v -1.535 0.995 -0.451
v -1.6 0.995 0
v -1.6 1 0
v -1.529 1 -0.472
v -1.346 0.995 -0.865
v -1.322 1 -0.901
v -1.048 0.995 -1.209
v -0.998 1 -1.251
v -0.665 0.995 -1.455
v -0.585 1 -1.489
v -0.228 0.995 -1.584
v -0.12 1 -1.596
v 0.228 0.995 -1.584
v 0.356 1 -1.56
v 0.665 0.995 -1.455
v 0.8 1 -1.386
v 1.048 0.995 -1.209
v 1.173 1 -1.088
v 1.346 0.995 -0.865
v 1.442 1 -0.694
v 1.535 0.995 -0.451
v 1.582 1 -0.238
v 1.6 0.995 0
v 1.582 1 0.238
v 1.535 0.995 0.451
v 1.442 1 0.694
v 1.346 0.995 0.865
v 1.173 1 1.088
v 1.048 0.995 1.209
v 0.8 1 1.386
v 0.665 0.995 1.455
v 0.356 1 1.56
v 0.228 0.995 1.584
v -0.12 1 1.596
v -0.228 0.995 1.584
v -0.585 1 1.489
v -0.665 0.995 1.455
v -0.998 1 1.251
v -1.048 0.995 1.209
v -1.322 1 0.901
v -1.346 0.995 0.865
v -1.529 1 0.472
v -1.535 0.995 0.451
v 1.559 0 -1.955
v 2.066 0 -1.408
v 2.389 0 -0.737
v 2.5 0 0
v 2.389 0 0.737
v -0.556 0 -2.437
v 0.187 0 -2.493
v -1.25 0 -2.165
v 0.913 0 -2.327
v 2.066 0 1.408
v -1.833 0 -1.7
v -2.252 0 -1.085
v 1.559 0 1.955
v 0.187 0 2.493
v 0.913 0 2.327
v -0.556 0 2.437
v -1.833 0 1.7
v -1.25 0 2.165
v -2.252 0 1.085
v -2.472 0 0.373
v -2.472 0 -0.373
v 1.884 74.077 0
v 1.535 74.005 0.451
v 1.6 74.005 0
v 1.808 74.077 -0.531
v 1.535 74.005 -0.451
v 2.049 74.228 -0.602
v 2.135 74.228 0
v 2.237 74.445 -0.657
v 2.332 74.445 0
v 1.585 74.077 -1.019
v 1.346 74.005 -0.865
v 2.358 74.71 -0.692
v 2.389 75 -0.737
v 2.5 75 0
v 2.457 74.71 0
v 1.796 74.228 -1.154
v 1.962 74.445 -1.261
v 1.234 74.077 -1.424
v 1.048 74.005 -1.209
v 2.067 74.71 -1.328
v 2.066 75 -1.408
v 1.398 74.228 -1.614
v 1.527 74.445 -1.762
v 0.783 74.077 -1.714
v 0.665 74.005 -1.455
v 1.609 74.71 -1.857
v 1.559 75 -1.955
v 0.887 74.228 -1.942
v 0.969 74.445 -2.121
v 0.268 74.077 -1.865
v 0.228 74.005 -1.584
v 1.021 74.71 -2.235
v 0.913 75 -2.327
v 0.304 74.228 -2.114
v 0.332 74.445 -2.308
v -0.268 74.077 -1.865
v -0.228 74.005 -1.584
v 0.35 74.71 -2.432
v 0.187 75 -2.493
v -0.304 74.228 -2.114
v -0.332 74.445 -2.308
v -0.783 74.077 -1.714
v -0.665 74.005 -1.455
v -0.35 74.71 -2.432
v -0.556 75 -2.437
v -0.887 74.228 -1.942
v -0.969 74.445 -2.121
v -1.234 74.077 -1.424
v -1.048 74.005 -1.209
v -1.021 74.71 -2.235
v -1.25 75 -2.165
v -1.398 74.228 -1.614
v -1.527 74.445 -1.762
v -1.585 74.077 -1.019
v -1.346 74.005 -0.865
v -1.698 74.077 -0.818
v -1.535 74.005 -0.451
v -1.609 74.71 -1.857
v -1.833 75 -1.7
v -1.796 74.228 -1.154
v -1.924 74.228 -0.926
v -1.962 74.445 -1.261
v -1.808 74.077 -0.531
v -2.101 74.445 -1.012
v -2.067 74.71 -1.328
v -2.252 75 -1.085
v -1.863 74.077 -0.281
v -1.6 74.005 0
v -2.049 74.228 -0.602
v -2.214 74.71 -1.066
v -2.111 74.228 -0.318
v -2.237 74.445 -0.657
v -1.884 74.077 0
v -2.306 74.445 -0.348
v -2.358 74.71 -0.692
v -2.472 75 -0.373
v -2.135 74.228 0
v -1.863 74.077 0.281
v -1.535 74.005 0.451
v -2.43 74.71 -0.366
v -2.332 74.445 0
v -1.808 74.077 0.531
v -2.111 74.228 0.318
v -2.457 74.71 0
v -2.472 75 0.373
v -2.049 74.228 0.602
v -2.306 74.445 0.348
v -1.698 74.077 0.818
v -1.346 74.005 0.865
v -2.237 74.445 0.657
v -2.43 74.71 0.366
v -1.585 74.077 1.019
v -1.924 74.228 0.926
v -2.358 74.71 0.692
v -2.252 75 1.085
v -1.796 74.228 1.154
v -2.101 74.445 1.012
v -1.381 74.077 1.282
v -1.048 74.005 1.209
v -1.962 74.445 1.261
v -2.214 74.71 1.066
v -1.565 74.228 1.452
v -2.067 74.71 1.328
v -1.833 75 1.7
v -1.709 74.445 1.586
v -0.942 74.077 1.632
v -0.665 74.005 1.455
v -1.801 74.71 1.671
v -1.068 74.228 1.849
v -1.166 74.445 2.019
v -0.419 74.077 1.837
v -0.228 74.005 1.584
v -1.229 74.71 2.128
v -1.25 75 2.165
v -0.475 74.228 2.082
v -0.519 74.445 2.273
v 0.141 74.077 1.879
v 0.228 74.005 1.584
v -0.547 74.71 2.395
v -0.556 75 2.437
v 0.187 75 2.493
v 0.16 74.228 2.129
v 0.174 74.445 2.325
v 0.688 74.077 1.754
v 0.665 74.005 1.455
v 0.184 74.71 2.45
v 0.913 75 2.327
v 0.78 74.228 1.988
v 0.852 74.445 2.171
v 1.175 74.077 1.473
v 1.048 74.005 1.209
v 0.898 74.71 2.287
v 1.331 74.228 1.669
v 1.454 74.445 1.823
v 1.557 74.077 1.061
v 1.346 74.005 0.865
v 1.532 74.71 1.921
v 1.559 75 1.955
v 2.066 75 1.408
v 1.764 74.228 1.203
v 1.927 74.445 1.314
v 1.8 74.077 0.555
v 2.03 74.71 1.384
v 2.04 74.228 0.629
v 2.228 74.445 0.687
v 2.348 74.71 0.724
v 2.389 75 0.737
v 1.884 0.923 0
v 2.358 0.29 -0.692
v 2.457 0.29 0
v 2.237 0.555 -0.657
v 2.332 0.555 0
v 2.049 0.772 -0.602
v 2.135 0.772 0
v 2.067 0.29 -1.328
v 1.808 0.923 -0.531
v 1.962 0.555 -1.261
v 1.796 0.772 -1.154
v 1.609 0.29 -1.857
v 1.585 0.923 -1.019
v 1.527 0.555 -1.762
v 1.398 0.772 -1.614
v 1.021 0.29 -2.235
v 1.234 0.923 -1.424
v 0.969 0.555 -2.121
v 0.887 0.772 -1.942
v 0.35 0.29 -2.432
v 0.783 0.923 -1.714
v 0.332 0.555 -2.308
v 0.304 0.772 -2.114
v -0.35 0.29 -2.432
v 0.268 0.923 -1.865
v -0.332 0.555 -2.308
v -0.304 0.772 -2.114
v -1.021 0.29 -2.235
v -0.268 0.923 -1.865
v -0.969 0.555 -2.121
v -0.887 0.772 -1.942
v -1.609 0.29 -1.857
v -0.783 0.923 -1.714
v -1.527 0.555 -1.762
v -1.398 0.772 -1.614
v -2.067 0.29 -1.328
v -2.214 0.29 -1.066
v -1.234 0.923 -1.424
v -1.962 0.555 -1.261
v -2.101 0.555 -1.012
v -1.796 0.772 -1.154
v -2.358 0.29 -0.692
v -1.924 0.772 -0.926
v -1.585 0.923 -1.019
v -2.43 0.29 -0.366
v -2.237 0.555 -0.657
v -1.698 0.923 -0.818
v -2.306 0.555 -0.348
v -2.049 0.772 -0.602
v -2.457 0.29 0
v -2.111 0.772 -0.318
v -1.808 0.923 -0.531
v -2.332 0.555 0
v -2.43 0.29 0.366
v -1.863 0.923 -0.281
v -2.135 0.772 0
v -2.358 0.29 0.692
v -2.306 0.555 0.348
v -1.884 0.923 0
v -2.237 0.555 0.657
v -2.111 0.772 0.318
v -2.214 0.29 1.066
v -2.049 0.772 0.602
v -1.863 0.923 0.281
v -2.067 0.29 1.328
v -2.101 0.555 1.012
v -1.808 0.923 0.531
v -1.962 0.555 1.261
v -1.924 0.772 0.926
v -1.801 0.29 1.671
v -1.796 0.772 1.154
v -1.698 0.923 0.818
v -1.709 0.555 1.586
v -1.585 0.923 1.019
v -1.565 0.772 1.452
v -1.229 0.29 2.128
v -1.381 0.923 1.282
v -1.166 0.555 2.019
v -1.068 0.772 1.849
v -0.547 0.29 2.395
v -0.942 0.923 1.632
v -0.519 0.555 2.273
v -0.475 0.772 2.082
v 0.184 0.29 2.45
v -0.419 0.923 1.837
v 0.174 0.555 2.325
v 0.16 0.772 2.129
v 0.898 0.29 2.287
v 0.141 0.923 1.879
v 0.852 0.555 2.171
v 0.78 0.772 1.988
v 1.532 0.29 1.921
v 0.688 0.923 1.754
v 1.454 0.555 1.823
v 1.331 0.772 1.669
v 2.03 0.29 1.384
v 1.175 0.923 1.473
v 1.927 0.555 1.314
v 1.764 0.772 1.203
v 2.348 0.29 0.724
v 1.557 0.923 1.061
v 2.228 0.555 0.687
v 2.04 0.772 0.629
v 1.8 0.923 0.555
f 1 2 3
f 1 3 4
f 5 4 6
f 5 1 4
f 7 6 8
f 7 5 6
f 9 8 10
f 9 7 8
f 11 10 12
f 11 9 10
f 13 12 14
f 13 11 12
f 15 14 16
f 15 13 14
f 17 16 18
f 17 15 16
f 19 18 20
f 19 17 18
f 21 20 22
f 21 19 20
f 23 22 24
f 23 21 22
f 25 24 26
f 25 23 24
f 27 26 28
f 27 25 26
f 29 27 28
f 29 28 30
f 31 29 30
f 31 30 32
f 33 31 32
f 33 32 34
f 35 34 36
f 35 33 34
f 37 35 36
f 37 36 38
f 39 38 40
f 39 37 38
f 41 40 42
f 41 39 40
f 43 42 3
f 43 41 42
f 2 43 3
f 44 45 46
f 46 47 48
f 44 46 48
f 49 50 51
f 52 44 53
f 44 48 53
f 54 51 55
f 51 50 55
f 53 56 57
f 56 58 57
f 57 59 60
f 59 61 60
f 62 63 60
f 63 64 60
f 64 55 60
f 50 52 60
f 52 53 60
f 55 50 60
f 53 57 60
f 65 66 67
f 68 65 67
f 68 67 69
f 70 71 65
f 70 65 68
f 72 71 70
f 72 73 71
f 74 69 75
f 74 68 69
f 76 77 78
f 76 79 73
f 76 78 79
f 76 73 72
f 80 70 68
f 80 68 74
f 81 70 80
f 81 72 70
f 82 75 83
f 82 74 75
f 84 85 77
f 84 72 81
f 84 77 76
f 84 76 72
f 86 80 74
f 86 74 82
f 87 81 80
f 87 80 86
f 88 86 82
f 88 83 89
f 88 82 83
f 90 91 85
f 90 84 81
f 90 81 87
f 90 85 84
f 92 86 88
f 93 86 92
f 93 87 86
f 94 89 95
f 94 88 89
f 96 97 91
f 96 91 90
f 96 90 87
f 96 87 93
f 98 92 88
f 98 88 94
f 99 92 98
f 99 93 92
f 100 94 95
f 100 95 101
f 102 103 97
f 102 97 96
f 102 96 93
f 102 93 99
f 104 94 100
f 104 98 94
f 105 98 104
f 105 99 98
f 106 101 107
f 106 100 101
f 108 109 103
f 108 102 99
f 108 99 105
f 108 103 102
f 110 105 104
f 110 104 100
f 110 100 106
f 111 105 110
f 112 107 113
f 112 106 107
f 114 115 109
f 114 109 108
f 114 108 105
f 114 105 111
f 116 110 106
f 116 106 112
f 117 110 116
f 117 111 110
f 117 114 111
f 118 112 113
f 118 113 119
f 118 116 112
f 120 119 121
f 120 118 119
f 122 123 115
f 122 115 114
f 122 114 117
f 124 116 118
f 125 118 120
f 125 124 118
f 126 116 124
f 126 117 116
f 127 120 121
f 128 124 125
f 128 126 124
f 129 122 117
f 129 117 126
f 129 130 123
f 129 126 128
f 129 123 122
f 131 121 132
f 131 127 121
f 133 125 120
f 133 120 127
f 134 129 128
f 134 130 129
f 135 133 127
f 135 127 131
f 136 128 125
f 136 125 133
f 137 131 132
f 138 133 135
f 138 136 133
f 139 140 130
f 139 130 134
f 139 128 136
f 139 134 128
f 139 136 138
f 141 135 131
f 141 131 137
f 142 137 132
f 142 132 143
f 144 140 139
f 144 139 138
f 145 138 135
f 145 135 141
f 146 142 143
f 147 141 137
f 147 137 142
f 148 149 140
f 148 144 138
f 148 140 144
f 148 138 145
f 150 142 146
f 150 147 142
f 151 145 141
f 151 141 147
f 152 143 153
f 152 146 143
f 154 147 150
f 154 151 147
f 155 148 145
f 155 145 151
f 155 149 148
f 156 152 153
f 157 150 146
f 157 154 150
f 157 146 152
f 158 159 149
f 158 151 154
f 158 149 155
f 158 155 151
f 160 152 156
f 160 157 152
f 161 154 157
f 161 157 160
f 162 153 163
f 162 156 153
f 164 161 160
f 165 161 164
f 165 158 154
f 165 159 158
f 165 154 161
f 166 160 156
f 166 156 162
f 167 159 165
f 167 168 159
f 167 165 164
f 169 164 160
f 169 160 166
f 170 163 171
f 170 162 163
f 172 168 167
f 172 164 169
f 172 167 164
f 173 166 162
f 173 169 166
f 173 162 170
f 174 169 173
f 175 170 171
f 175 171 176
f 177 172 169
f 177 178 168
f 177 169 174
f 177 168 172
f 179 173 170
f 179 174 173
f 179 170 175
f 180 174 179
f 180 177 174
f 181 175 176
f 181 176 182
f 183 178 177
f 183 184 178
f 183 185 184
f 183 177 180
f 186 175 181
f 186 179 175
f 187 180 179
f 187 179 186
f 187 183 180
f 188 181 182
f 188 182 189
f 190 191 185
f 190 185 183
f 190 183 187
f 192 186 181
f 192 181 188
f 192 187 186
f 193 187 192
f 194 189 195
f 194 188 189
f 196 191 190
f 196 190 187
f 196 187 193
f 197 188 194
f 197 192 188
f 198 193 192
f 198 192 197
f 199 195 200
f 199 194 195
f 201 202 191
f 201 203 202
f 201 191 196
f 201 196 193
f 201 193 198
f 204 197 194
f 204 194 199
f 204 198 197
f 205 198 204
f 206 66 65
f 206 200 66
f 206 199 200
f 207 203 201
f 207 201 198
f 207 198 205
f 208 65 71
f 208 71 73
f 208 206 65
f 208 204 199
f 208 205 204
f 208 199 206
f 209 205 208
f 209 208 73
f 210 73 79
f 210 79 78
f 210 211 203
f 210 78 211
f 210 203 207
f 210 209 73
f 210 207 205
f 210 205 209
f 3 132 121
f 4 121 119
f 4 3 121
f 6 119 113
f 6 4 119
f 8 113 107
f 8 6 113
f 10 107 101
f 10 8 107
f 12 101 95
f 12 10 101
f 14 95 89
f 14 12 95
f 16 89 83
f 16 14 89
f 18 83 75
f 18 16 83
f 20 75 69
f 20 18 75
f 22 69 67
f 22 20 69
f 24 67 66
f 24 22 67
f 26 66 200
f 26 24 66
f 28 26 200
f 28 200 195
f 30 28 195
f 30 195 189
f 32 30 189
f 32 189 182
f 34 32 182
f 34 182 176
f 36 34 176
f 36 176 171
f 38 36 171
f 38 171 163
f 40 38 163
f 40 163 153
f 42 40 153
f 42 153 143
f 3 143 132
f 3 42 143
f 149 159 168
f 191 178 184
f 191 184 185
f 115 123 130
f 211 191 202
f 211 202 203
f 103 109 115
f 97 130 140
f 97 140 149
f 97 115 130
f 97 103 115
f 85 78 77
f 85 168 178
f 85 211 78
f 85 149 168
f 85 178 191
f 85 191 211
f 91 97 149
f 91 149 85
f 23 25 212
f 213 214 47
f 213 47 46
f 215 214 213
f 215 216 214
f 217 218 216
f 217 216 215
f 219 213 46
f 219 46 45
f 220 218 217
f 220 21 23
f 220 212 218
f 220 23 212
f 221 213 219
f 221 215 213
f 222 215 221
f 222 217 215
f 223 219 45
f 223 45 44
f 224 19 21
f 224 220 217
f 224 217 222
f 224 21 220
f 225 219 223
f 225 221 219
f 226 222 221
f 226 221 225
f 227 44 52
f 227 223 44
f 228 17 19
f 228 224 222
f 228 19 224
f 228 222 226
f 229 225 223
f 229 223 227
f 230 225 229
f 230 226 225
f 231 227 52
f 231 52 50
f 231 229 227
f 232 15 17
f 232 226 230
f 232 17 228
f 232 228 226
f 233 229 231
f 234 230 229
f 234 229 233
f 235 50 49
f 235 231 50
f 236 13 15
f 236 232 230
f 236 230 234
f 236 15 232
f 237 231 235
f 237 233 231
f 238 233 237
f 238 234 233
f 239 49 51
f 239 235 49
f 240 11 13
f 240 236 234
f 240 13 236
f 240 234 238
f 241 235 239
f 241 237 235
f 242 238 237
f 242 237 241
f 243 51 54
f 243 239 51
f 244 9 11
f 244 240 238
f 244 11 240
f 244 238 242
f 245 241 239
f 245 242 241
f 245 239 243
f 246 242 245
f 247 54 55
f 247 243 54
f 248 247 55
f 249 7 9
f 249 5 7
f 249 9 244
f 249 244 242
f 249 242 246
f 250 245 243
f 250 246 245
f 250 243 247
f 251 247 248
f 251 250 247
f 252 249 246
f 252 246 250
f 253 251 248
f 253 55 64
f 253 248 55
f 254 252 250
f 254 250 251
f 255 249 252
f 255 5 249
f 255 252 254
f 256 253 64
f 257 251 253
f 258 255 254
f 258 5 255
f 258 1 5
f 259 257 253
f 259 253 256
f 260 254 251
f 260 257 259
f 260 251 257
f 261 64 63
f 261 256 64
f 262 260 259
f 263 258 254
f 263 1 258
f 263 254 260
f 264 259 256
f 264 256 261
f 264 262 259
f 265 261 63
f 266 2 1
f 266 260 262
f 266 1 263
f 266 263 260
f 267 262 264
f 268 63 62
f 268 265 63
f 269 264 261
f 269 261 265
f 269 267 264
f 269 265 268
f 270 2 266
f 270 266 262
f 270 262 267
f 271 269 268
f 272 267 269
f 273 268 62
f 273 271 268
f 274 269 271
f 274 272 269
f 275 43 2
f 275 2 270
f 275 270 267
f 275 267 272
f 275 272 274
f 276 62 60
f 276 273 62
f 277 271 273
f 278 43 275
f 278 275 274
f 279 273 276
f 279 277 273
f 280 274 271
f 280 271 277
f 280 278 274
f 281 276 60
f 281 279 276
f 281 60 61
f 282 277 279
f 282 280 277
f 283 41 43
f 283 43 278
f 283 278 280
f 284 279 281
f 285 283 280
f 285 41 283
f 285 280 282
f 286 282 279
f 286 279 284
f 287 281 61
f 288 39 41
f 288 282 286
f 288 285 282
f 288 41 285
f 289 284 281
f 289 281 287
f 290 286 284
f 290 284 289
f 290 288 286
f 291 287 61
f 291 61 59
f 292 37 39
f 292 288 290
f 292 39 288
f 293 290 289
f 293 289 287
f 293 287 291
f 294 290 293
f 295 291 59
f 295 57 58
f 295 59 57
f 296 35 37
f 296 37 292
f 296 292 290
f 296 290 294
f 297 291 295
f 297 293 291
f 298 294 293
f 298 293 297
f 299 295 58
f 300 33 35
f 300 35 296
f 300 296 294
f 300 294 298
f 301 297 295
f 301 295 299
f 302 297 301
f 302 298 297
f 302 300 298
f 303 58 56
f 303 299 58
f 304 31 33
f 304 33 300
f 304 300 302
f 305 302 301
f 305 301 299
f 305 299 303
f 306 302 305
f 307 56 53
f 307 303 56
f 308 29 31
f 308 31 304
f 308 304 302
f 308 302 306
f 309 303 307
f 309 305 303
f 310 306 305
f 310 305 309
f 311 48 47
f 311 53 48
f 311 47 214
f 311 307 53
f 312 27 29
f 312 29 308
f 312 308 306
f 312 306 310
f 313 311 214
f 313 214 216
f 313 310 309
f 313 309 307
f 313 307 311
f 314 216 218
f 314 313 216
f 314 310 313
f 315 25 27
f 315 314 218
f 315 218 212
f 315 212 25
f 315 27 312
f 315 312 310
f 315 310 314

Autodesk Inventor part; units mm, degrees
ref_plane "YZ Plane" through (0, 0, 0) normal (1, 0, 0) x (0, 1, 0)
ref_plane "XZ Plane" through (0, 0, 0) normal (0, 1, 0) x (-1, 0, 0)
ref_plane "XY Plane" through (0, 0, 0) normal (0, 0, 1) x (1, 0, 0)
sketch "Эскиз1" plane through (0, 0, 0) normal (0, 1, 0) x (-1, 0, 0)
  circle A0 centre (0, 0) radius 1.6
  dimension "d0" = 3.2
extrude "Выдавливание1" add sketch "Эскиз1" along normal blind 75
sketch "Эскиз2" plane through (0, 75, 0) normal (0, 1, 0) x (1, 0, 0)
  circle A0 centre (0, 0) radius 2.5
  dimension "d3" = 5
extrude "Выдавливание2" add sketch "Эскиз2" against normal blind 1
fillet "Сопряжение1" radius 1 1 edges at (-2.5, 74, 0)
sketch "Эскиз3" plane through (0, 0, 0) normal (0, -1, 0) x (1, 0, 0)
  circle A0 centre (0, 0) radius 2.5
extrude "Выдавливание3" add sketch "Эскиз3" against normal blind 1
fillet "Сопряжение2" radius 1 1 edges at (-2.5, 1, 0)
ref_plane "РабПлоскость1" through (-4.5, 3.005, 18.077) normal (-1, 0, 0) x (0, 0, -1)
sketch "Эскиз4" plane through (-4.5, 3.005, 18.077) normal (-1, 0, 0) x (0, 0, -1)
  line L0 (15.577, -71.995) -> (20.577, -71.995) projected
  line L1 (20.577, 3.005) -> (15.577, 3.005) projected
  point P0 (18.077, 3.005)
  dimension "d10" = 75
properties part number "vint"
